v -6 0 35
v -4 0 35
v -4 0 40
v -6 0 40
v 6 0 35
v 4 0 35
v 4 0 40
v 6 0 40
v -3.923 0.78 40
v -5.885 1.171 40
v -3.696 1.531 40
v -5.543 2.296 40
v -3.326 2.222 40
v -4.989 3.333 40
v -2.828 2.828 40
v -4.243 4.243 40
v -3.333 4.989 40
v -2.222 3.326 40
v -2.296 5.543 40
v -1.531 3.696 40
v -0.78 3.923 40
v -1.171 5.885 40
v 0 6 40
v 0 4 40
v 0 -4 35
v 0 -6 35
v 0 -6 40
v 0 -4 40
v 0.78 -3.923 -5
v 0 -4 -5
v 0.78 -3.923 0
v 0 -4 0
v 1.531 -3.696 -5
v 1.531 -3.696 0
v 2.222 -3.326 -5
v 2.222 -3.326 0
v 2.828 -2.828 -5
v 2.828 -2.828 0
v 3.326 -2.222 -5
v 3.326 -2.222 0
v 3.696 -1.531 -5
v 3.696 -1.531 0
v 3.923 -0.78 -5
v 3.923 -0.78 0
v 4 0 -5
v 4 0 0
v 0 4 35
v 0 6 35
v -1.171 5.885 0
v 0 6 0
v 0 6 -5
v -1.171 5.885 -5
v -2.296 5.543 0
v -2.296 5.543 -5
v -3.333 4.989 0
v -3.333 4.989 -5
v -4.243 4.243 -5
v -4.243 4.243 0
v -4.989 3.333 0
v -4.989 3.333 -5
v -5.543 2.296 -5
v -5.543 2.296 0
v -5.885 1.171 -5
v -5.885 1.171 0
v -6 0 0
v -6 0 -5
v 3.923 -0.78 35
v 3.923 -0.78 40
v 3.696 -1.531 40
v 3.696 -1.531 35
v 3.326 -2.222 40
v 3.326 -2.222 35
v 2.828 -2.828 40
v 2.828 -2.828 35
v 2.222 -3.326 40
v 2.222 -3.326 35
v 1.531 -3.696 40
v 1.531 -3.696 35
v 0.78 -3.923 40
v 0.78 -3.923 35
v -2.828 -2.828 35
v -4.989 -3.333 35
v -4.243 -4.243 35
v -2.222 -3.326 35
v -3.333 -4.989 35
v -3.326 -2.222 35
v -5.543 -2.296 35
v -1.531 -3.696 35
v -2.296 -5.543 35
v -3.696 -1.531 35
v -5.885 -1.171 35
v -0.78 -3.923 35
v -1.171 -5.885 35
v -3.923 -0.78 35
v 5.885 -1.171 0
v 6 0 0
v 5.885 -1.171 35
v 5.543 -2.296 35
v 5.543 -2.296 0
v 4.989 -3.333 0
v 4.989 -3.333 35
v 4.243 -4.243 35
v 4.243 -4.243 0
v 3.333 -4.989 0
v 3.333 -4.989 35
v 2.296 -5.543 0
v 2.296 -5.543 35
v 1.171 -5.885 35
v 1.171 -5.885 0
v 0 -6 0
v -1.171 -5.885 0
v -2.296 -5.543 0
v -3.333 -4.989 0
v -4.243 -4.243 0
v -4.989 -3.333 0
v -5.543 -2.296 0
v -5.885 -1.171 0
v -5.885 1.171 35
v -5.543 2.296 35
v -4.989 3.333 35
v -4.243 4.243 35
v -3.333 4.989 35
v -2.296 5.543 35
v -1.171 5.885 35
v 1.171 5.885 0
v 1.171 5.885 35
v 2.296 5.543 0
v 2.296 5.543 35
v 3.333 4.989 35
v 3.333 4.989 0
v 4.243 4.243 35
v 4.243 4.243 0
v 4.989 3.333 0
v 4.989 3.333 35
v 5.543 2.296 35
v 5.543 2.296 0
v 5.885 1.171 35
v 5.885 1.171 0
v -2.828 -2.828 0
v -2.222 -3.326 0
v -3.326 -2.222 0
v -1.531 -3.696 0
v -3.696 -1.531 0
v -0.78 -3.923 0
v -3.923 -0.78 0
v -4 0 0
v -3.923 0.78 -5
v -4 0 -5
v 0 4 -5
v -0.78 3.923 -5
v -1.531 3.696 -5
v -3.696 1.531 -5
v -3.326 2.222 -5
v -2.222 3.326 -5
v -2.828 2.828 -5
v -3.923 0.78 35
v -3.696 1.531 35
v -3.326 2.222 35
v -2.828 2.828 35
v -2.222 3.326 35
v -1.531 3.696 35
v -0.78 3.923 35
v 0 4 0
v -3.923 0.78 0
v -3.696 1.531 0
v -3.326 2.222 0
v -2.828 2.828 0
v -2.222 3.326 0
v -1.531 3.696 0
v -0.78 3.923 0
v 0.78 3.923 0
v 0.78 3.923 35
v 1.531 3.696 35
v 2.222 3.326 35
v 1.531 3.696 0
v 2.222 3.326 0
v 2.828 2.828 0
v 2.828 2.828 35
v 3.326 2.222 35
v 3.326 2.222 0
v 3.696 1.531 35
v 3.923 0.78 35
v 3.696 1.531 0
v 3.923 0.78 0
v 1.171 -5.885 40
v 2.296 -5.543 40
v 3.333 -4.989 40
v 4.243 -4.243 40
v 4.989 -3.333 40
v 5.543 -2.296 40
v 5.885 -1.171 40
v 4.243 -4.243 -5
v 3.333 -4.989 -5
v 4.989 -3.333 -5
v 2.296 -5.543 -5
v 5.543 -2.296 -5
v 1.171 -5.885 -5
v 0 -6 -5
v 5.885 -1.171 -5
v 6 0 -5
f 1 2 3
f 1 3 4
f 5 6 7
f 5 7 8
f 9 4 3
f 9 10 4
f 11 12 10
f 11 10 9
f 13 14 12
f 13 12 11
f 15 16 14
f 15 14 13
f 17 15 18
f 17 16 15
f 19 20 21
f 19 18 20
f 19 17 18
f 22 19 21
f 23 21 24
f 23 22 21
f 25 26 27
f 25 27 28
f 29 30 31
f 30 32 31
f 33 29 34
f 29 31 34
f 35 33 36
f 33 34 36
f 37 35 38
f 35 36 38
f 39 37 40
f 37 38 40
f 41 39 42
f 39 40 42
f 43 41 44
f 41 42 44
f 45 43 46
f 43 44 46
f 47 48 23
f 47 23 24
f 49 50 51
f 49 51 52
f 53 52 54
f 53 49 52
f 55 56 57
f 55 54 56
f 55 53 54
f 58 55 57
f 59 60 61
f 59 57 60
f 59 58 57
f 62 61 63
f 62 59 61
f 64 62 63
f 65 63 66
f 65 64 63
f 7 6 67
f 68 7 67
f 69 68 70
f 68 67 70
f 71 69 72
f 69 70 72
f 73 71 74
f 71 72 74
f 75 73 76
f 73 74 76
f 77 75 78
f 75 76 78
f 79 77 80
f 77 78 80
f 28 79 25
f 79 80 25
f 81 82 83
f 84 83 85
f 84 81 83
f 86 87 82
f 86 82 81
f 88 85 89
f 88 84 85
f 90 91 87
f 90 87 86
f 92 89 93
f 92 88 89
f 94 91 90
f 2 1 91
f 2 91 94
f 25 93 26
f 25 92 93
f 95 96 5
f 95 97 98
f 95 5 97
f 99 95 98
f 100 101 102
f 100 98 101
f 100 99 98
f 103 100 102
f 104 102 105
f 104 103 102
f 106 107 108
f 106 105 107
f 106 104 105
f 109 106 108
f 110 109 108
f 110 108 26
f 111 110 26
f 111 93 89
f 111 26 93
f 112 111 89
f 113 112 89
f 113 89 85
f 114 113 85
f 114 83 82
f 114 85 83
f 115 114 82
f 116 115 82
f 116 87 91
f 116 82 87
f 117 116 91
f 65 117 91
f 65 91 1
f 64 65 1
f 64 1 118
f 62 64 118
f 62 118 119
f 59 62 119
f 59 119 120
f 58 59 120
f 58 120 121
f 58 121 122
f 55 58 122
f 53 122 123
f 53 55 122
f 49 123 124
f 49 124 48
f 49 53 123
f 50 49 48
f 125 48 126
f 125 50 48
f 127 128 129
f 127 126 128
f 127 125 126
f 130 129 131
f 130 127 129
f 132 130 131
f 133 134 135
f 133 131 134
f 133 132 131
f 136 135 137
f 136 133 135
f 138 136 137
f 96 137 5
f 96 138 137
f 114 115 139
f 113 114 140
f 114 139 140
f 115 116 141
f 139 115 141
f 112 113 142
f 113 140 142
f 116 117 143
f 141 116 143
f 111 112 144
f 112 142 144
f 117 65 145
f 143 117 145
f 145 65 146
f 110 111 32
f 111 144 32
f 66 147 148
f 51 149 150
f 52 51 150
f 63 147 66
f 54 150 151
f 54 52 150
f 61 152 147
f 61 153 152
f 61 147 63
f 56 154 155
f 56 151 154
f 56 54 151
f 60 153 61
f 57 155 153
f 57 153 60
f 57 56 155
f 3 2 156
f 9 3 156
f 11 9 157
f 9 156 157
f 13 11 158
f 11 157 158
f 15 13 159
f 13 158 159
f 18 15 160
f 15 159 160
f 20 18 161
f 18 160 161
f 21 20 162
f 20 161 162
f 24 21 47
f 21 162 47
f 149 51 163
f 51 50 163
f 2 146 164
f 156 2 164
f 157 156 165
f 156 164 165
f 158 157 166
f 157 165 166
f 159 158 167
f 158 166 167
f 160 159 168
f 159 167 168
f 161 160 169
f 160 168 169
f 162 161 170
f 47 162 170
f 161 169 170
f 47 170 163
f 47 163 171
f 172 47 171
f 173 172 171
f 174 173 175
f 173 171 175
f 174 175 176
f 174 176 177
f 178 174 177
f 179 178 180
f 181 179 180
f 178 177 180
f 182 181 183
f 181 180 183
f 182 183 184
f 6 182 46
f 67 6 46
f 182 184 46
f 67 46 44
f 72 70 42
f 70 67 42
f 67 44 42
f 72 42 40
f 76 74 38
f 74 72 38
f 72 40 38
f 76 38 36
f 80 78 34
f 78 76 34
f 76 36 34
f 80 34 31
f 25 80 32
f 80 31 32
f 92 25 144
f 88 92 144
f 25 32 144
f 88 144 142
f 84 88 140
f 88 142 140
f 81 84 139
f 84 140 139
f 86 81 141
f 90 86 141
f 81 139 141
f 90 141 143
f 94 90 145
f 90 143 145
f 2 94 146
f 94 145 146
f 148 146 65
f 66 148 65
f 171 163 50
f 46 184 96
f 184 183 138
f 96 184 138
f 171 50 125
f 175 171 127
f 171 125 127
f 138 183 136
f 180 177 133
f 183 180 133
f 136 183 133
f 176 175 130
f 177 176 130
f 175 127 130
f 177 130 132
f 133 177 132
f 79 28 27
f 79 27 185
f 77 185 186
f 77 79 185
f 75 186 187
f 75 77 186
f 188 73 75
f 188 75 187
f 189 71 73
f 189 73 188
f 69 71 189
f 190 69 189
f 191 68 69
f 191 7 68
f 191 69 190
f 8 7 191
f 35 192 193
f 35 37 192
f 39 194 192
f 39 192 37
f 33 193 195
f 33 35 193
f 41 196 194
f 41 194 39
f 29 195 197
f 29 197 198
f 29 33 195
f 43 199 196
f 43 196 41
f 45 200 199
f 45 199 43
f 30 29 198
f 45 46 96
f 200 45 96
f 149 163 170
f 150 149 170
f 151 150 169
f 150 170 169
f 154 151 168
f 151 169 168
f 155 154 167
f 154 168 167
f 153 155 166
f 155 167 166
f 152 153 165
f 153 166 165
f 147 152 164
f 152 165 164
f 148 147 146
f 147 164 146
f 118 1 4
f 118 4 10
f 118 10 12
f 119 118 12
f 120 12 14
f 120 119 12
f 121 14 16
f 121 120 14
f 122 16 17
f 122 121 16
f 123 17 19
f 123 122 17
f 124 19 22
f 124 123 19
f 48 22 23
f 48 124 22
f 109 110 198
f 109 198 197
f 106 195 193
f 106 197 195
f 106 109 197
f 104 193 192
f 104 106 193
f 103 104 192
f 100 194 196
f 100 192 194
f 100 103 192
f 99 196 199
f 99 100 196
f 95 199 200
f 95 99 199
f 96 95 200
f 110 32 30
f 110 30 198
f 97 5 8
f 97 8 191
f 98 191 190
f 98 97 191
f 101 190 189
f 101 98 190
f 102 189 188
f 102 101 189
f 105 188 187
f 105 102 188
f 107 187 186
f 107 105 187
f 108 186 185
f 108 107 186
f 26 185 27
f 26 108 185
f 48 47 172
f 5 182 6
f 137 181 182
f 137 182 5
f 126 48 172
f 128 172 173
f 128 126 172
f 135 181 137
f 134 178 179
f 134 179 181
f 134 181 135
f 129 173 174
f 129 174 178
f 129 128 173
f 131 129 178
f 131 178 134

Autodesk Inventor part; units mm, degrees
ref_plane "YZ Plane" through (0, 0, 0) normal (1, 0, 0) x (0, 1, 0)
ref_plane "XZ Plane" through (0, 0, 0) normal (0, 1, 0) x (-1, 0, 0)
ref_plane "XY Plane" through (0, 0, 0) normal (0, 0, 1) x (1, 0, 0)
sketch "Skizze1" plane through (0, 0, 0) normal (0, 0, 1) x (1, 0, 0)
  circle A0 centre (0, 0) radius 6
  dimension "d0" = 12
extrude "Extrusion1" add sketch "Skizze1" along normal blind 35
sketch "Skizze2" plane through (0, 0, 0) normal (0, 0, -1) x (-1, 0, 0)
  circle A0 centre (0, 0) radius 4
  dimension "d3" = 8
extrude "Extrusion2" cut sketch "Skizze2" against normal blind 35
sketch "Skizze9" plane through (0, 0, 35) normal (0, 0, 1) x (1, 0, 0)
  arc A0 (0, 6) -> (-6, 0) centre (0, 0) ccw
  arc A1 (0, 4) -> (-4, 0) centre (0, 0) ccw
  line L0 (0, 4) -> (0, 6)
  line L1 (4, 0) -> (6, 0)
  line L2 (-4, 0) -> (-6, 0)
  arc A2 (0, -6) -> (6, 0) centre (0, 0) ccw
  arc A3 (0, -4) -> (4, 0) centre (0, 0) ccw
  line L3 (0, -4) -> (0, -6)
sketch "Skizze9 outline for Extrusion8" plane through (0, 0, 35) normal (0, 0, 1) x (1, 0, 0)
  line L0 (0, 6) -> (0, 4)
  arc A0 (0, 4) -> (-4, 0) centre (0, 0) ccw
  line L1 (-4, 0) -> (-6, 0)
  arc A1 (-6, 0) -> (0, 6) centre (0, 0) cw
  line L2 (4, 0) -> (6, 0)
  arc A2 (6, 0) -> (0, -6) centre (0, 0) cw
  line L3 (0, -6) -> (0, -4)
  arc A3 (0, -4) -> (4, 0) centre (0, 0) ccw
extrude "Extrusion8" add sketch "Skizze9 outline for Extrusion8" along normal blind 5
sketch "Skizze10" plane through (0, 0, 0) normal (0, 0, -1) x (-1, 0, 0)
  line L0 (0, -4) -> (0, -6) projected
  line L1 (-4, 0) -> (-6, 0) projected
  line L2 (-6, 0) -> (-4, 0)
  line L3 (0, 6) -> (0, 4) projected
  line L4 (0, -4) -> (0, -6)
  line L5 (-4, 0) -> (-6, 0)
  arc A0 (-6, 0) -> (0, -6) centre (0, 0) ccw
  arc A1 (6, 0) -> (0, 6) centre (0, 0) ccw
  arc A2 (4, 0) -> (0, 4) centre (0, 0) ccw
  line L6 (4, 0) -> (6, 0) projected
  line L7 (6, 0) -> (4, 0)
  arc A3 (-4, 0) -> (0, -4) centre (0, 0) ccw
extrude "Extrusion9" add sketch "Skizze10" along normal blind 5
properties part number "Steckhülse"
